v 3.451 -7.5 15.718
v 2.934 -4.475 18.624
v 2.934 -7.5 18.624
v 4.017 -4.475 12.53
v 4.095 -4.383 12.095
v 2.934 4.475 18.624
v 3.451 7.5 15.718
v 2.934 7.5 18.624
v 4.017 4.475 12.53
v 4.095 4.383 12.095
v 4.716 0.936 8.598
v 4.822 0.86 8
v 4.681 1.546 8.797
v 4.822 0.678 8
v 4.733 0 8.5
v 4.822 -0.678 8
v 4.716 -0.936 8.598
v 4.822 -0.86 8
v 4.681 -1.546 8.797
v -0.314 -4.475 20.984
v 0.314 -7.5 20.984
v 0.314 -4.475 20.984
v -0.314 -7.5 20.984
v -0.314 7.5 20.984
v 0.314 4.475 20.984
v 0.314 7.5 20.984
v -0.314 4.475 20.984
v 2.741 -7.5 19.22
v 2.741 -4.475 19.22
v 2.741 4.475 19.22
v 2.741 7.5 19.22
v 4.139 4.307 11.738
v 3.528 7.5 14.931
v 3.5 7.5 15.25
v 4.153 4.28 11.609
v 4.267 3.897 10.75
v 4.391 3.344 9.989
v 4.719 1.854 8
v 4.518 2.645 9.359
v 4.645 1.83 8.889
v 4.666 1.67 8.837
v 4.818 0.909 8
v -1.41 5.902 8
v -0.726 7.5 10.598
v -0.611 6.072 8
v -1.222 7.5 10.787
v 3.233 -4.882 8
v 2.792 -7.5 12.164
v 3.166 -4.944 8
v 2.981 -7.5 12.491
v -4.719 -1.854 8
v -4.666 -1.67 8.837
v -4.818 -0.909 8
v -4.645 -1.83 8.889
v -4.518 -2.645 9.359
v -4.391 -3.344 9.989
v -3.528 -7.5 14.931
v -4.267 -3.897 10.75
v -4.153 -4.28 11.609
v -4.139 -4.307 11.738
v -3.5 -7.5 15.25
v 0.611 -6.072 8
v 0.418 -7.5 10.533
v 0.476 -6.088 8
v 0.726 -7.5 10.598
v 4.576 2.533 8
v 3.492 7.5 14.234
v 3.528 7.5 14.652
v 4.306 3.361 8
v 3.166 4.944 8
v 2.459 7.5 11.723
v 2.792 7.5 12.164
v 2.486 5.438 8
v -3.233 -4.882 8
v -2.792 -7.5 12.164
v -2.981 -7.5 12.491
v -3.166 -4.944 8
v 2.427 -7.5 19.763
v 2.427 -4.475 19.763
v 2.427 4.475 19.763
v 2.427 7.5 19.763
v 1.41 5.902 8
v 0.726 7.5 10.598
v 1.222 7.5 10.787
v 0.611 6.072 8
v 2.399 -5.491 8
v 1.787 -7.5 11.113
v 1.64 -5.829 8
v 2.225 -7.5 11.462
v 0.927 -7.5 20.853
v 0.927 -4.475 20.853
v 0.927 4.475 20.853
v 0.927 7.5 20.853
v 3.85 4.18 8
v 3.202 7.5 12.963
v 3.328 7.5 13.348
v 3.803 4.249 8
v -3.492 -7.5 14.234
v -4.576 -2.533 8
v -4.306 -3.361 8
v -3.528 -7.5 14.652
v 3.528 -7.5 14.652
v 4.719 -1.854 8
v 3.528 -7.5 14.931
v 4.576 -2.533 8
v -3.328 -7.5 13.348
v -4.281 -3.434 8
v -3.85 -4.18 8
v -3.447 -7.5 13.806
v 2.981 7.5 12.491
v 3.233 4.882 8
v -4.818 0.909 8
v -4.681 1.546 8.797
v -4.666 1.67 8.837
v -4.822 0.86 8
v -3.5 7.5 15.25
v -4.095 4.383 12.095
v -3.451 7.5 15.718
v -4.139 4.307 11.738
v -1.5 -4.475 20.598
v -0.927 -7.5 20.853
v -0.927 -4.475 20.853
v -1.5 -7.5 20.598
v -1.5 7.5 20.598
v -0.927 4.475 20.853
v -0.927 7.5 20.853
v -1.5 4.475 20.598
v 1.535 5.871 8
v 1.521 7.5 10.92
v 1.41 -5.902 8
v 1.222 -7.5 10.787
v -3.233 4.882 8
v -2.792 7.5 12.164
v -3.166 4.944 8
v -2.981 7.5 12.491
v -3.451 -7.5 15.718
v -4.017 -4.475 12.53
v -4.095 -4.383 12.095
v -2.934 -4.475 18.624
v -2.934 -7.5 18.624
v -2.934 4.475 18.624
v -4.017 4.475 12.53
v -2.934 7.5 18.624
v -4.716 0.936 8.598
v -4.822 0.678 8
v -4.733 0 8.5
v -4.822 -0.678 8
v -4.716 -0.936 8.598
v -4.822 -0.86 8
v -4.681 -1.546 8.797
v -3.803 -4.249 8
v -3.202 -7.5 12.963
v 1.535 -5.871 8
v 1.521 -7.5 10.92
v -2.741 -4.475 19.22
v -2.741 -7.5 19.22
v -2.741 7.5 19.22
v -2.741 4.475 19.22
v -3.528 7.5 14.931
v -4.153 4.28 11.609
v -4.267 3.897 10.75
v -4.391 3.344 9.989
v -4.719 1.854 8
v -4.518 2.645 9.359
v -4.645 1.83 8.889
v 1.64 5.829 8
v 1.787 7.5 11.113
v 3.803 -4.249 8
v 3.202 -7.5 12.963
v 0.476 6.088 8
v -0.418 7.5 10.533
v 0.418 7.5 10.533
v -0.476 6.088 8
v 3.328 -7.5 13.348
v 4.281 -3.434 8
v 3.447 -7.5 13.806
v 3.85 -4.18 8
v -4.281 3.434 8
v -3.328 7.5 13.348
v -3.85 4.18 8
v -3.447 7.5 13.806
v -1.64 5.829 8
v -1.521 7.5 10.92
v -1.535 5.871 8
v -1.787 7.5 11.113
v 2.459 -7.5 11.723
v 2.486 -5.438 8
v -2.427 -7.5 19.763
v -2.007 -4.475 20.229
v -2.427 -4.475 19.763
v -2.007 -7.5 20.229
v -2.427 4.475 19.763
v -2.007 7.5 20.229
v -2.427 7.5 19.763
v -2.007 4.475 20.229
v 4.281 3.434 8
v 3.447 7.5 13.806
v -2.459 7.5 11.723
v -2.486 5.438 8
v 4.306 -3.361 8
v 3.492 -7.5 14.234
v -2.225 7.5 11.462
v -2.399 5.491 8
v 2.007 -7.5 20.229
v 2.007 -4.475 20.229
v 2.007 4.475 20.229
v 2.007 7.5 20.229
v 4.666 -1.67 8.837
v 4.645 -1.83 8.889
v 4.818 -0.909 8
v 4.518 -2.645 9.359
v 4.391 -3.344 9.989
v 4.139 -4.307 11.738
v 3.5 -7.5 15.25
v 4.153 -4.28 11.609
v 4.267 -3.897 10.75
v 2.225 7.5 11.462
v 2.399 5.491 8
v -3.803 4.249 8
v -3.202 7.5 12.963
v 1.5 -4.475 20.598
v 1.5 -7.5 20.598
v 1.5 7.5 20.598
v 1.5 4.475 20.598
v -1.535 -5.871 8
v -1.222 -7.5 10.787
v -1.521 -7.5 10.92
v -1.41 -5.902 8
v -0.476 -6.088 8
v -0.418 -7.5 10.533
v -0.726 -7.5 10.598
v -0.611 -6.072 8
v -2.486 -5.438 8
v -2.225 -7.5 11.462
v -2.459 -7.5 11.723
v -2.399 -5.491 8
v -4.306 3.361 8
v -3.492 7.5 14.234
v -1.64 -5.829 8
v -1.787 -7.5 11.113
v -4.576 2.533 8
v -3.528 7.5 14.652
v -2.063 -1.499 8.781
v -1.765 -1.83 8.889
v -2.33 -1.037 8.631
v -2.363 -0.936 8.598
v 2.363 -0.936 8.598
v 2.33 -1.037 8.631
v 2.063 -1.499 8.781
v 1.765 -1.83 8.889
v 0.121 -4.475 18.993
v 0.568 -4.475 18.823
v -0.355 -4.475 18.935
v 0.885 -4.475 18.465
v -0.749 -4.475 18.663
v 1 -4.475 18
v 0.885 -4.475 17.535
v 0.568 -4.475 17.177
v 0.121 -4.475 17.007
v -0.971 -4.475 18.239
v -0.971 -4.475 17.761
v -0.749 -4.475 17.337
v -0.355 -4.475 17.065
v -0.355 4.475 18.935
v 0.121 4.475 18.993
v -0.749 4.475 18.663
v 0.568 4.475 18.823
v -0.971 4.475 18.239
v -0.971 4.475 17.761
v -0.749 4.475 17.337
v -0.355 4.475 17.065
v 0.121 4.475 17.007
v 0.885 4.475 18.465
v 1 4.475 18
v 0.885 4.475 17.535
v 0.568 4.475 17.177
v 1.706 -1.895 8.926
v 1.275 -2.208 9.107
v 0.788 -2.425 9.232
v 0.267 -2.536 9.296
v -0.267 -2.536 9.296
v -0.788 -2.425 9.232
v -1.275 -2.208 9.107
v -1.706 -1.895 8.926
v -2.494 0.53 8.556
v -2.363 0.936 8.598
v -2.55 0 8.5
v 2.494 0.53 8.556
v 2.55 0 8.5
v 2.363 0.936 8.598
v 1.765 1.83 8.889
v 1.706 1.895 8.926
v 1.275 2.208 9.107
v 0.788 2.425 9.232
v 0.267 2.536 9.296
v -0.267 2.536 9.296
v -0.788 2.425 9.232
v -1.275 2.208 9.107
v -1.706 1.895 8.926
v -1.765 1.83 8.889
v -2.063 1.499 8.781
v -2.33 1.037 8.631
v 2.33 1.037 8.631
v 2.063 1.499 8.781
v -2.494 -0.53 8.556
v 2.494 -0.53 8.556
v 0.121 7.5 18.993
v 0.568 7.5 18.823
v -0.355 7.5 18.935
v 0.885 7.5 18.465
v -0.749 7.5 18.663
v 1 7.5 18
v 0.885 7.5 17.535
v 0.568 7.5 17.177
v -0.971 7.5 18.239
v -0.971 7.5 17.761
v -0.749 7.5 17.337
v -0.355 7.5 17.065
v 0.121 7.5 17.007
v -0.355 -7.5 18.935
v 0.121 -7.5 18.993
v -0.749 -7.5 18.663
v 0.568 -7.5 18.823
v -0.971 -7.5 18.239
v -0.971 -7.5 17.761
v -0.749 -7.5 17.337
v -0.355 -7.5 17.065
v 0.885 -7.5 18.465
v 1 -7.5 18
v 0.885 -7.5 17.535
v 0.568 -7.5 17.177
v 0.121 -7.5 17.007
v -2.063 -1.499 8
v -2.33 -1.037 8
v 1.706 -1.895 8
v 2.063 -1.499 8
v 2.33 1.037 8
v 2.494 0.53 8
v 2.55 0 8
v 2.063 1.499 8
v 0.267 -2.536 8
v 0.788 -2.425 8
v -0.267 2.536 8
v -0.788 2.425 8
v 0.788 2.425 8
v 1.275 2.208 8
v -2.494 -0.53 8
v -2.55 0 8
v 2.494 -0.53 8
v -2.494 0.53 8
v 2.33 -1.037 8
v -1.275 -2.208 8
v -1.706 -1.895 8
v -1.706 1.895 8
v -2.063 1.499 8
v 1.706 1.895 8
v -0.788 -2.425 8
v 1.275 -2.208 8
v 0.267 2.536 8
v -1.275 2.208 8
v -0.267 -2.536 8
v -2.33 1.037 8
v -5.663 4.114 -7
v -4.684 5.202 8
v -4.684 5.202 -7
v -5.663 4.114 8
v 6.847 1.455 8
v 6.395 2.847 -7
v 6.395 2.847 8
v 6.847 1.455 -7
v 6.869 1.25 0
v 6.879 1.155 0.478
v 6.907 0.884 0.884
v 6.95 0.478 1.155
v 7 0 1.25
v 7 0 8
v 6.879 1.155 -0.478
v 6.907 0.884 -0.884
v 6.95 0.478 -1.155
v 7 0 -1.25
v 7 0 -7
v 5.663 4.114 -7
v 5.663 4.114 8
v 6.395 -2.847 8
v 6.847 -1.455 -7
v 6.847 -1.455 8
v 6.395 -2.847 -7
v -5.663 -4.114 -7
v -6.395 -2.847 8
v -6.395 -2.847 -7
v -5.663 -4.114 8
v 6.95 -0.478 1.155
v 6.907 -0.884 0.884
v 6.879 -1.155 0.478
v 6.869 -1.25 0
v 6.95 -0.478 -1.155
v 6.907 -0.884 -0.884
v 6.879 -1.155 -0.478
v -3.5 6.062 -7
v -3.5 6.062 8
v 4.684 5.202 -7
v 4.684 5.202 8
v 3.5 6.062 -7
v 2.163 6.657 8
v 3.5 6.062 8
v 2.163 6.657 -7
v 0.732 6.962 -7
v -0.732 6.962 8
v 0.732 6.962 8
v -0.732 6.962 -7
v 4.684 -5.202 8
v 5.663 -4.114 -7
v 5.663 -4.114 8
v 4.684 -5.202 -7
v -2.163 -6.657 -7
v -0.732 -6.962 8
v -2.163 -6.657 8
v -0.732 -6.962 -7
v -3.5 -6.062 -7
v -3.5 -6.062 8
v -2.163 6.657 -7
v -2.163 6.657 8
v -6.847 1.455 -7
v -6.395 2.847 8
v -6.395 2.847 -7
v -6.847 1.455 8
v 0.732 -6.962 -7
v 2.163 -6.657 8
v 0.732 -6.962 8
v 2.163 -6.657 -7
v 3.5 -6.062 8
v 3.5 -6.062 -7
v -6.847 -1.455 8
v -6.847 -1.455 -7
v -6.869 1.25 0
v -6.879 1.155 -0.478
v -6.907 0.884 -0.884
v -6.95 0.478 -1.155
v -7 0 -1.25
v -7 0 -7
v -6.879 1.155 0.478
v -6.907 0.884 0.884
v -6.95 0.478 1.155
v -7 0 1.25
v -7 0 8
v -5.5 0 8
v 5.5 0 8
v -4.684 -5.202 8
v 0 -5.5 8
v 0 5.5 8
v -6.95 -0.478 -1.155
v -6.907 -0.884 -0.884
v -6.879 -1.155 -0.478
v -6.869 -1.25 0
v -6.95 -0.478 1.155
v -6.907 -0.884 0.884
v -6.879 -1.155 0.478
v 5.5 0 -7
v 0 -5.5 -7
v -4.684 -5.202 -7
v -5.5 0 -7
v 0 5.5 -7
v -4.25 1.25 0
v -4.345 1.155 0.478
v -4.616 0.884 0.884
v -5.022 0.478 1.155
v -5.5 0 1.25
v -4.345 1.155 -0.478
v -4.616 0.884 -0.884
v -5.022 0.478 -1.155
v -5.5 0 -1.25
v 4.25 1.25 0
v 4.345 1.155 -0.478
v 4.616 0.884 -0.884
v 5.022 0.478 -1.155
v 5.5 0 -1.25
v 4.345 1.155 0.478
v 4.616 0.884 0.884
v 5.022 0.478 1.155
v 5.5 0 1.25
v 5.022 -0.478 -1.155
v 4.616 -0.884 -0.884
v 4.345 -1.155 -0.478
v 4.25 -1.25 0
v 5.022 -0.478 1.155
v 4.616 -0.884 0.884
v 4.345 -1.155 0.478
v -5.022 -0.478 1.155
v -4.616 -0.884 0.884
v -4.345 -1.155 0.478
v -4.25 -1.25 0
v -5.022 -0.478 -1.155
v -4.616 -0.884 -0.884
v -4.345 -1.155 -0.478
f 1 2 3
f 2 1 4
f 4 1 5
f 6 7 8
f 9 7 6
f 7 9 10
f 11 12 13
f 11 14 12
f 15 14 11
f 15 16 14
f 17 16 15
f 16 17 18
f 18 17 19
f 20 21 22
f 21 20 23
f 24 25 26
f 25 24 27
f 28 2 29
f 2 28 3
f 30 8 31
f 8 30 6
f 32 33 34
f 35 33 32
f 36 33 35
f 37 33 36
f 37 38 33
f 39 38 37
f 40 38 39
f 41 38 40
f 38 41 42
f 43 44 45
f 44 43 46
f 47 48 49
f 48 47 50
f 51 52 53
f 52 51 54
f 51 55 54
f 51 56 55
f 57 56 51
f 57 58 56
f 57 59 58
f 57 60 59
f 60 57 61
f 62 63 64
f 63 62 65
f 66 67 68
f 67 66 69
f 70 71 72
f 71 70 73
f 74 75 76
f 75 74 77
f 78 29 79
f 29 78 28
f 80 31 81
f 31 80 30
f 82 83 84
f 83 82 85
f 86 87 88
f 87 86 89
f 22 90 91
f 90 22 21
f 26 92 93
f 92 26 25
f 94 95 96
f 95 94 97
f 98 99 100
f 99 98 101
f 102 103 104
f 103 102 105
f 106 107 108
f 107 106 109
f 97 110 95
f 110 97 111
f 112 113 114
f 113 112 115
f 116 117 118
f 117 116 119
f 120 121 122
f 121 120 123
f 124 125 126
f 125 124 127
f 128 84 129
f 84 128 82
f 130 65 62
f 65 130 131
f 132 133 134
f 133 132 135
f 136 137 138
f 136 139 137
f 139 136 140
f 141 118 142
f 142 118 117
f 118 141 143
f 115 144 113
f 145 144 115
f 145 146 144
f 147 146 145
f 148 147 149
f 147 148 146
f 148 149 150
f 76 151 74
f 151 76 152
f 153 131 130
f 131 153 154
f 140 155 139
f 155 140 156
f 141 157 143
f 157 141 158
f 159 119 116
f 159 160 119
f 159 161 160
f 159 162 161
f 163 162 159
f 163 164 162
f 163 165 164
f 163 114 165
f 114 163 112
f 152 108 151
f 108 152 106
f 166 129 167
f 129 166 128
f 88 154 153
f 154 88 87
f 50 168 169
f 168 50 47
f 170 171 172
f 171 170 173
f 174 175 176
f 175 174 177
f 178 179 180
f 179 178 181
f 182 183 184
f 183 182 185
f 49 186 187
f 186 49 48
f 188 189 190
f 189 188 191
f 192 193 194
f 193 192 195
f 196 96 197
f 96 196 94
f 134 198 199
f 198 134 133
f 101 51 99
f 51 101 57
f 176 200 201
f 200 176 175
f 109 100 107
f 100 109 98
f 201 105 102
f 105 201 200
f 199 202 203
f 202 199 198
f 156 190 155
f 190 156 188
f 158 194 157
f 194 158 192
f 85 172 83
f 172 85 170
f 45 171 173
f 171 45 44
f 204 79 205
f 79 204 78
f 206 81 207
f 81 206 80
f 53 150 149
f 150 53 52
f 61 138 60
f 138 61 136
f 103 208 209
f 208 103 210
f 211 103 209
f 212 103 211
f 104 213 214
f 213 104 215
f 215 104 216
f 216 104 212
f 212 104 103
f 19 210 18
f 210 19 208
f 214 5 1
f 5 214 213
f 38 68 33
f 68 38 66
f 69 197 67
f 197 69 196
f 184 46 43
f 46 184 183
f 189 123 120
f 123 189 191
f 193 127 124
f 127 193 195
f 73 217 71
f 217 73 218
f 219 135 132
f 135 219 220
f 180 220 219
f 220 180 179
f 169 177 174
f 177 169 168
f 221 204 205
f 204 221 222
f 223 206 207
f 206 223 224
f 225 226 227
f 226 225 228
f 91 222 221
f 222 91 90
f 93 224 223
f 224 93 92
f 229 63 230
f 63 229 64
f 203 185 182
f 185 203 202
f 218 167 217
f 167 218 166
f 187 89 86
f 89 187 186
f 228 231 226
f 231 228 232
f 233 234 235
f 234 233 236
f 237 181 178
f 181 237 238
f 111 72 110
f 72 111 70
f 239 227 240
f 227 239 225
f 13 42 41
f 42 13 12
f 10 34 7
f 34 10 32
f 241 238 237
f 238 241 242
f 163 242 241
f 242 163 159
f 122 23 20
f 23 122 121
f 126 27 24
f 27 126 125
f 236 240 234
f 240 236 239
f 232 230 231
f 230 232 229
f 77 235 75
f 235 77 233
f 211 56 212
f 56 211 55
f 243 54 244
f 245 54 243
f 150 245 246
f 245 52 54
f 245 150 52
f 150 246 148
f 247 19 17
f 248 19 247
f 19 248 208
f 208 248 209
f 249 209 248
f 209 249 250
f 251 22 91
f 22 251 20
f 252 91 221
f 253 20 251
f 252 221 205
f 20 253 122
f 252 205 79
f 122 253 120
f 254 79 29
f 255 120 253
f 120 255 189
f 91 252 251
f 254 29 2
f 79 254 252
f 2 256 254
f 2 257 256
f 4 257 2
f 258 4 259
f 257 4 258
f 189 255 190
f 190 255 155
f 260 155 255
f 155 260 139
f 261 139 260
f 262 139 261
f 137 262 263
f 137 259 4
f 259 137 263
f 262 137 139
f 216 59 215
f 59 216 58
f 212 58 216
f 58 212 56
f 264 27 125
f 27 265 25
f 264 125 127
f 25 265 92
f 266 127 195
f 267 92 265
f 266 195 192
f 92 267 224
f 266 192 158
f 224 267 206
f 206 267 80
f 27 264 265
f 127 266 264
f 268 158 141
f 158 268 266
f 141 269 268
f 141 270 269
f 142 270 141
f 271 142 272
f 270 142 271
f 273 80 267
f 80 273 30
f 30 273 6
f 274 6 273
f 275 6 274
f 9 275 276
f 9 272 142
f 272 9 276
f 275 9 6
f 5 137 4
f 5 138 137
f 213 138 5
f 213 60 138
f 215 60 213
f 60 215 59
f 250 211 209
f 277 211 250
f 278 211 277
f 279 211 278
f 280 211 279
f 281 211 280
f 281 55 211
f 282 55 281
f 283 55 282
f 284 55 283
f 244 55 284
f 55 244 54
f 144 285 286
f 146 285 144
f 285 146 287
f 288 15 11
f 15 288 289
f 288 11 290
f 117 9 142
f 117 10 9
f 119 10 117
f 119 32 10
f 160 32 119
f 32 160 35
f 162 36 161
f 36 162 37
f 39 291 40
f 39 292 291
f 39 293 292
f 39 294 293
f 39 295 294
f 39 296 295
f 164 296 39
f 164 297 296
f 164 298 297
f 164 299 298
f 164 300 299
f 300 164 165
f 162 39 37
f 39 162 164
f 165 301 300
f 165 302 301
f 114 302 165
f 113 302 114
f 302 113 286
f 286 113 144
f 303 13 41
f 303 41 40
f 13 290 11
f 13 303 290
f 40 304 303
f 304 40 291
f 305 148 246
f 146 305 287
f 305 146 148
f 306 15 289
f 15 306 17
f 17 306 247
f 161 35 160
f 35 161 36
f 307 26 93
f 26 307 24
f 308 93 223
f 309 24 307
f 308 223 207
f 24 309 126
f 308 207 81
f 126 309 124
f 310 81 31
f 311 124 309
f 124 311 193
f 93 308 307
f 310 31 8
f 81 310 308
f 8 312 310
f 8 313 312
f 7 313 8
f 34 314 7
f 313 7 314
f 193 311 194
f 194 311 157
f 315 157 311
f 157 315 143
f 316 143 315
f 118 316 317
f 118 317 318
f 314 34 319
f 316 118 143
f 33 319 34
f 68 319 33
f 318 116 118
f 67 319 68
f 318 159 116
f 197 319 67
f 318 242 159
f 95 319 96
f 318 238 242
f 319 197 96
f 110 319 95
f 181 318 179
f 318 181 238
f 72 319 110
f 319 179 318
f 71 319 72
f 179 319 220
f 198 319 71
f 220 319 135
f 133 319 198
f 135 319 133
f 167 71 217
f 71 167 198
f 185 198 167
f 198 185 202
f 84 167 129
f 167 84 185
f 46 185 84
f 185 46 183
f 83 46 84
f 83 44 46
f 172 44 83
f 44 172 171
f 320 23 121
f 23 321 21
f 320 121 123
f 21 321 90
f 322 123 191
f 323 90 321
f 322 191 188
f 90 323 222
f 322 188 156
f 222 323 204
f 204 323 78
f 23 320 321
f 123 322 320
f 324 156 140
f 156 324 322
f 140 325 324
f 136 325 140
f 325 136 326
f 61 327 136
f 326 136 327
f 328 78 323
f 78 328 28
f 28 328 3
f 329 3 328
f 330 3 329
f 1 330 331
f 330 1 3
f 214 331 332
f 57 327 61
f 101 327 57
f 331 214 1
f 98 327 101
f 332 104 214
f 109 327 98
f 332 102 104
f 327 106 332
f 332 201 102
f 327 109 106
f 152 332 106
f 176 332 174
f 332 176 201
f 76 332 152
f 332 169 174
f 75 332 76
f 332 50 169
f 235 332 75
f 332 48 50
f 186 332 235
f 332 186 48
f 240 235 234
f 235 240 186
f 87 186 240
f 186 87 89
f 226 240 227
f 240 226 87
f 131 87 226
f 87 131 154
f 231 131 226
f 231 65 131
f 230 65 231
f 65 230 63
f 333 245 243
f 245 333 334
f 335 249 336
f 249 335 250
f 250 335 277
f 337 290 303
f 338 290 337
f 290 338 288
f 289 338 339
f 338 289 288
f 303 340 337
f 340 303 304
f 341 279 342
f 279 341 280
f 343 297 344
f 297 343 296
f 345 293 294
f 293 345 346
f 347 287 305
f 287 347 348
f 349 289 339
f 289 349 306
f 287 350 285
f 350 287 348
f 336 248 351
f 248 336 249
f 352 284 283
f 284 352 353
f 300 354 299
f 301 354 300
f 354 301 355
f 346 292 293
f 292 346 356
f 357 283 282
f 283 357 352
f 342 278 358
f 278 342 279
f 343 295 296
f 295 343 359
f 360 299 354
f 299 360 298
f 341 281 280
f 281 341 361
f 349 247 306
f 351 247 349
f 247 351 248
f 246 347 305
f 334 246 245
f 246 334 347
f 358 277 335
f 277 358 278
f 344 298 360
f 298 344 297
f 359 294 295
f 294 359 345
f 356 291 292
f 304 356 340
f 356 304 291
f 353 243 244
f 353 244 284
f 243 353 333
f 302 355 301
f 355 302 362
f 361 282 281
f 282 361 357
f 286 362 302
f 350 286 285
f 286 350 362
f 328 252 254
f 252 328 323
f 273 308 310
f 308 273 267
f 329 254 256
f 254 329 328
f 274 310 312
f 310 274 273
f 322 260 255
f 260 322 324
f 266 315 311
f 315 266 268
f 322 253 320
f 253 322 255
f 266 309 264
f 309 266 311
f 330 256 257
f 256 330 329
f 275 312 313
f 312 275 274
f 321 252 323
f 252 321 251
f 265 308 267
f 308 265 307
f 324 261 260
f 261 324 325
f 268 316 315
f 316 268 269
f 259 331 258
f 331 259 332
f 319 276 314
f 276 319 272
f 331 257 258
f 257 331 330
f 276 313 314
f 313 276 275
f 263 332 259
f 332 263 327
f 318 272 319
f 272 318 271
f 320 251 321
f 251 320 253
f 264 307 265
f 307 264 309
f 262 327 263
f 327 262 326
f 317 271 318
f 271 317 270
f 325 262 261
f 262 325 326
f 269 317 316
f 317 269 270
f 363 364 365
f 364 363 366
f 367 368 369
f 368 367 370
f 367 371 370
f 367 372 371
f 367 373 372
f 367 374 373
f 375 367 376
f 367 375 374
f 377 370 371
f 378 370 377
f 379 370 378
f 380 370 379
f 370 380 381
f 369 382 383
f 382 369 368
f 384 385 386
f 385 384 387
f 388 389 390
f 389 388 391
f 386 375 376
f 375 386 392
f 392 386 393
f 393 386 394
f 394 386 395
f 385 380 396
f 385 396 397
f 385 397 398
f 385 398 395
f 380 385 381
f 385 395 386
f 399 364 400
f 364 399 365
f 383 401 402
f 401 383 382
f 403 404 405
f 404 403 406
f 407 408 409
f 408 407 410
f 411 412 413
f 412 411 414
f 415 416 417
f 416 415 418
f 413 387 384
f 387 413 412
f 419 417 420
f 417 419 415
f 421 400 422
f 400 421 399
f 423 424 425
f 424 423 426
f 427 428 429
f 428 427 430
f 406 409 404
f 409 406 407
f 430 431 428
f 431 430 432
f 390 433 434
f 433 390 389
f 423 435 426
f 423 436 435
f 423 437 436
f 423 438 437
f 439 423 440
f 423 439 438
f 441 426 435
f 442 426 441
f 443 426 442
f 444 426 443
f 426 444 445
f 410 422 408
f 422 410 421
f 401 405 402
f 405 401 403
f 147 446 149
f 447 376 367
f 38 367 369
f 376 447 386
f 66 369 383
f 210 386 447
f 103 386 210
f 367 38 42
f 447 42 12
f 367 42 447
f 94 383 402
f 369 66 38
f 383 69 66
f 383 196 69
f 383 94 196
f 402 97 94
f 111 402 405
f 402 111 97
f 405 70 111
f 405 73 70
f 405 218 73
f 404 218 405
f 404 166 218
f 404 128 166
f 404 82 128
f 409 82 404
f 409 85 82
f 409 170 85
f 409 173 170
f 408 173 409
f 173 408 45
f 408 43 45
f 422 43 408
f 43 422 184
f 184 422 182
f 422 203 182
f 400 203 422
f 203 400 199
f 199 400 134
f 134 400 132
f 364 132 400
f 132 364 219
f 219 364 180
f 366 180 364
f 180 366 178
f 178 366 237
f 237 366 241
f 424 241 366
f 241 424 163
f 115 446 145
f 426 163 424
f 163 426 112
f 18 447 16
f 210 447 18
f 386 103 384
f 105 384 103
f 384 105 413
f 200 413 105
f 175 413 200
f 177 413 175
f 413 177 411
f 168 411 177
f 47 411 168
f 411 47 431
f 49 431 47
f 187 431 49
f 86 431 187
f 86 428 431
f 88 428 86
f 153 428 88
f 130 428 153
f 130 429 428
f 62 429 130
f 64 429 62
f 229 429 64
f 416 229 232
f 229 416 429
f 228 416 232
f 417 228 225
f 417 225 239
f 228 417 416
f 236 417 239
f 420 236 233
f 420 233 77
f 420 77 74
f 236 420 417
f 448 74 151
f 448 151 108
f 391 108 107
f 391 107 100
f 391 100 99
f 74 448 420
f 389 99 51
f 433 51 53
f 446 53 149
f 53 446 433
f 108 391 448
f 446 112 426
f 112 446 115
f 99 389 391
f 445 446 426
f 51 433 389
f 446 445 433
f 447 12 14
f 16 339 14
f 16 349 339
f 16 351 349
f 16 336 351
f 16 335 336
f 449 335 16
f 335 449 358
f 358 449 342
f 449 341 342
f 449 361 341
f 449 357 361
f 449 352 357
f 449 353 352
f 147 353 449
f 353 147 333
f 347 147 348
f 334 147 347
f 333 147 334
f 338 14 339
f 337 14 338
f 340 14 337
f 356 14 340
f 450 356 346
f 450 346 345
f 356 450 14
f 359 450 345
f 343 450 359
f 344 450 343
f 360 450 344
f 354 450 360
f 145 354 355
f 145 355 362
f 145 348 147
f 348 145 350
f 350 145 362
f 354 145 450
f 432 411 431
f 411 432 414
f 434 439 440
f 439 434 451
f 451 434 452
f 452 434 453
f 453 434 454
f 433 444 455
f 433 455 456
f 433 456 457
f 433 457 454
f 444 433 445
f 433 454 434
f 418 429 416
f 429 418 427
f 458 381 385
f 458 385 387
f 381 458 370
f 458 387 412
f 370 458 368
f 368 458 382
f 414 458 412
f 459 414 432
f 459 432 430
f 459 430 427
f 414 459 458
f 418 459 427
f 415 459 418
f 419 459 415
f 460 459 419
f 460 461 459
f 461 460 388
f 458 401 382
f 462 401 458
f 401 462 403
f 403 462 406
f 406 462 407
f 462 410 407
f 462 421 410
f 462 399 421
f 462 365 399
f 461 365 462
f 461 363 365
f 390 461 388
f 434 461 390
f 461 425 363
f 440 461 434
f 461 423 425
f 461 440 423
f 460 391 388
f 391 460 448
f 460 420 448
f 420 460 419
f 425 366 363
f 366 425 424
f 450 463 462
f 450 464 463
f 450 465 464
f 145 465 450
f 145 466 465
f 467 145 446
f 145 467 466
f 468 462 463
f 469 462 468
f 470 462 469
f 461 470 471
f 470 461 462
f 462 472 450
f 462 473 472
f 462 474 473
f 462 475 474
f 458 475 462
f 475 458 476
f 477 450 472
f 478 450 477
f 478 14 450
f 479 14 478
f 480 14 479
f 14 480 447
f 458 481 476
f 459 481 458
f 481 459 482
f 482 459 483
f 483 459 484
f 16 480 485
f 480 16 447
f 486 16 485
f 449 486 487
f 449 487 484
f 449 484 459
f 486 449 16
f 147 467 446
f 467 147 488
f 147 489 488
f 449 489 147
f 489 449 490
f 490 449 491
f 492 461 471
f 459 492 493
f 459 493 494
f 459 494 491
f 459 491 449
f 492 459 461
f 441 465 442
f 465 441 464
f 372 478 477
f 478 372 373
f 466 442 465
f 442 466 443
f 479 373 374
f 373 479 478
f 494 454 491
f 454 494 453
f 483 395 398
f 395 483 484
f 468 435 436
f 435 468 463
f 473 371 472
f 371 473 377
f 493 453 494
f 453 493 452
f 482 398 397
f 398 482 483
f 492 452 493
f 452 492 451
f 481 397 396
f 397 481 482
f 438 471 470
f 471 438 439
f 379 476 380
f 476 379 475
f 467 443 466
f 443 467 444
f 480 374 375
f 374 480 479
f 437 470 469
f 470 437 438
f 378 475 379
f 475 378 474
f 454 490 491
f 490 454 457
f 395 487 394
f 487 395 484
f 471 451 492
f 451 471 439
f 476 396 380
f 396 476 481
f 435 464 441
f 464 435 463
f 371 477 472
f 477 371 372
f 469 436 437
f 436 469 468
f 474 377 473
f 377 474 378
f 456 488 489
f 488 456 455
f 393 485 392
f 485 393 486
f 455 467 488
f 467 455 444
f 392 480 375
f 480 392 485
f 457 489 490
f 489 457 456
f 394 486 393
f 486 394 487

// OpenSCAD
shaft_d = 5.1;
shaft_pin = 2.5;
mount_d = 6;
mount_pin = 2;
d = 10;
h0 = 6;
h1 = 18;
h2 = -5;
$fs=0.5;
fork_d = 9;

module fork() {
    w= 15;
    w1 = w +5;

    difference() {
        union() {
            hull() {
                translate([0,w1/2,h1]) rotate([90,0,0]) cylinder(d=mount_d, h=w1);
                translate([0,0,h0]) rotate([0,0,0]) cylinder(d=10, h=1);
            }
            cylinder(d=10, h=h0);
        }
        hull() {
            translate([-10,0,h1+h2]) rotate([0,90,0]) cylinder(d=fork_d, h=w1);
            translate([-10,0,h1+100]) rotate([0,90,0]) cylinder(d=fork_d, h=w1);
        }
        
        // side trim
        translate([-15, w/2 ,0]) cube(30);
        translate([-15, -30-w/2 ,0]) cube(30);
        
        // shaft hole
        cylinder(d= shaft_d, h= h1);
        // shaft pin
        translate([-30,0,h0/2]) rotate([0,90,0]) cylinder(d= shaft_pin, h= 60);
        
        //mount hole
        translate([0,w1/2,h1]) rotate([90,0,0]) cylinder(d=mount_pin, h=w1);
    }
}
module fork_male() {
    l = 50;
    difference() {
        union() {
            fork();
            //translate([0,0,-l+8])cylinder(d=10, h=l);
            translate([0,0,-l+8])cylinder(d=6.5, h=l, $fn=4);
        }
        
    }
    
}

module fork_female() {
    l = 50;
    difference() {
        union() {
            fork();
            translate([0,0,-l+8])cylinder(d=10, h=l);
        }
        translate([0,0,-l+8])cylinder(d=7.5, h=l, $fn=4);
    }
    
}
module fork_big() {
    l = 15;
    difference() {
        union() {
            fork();
            translate([0,0,-l+8])cylinder(d=14, h=l);
        }
        translate([0,0,-l+8])cylinder(d=11, h=l, $fn=4);
        translate([-30,0,0]) rotate([0,90,0]) cylinder(d= shaft_pin, h= 60);
    }
    
}
module ball() {
    $fs=0.5;
    difference() { 
        cylinder(d=8, h=8);
        translate([0,10,1+2]) rotate([90,0,0]) cylinder(d=2, h=80);
        translate([-10,0,1+2+2]) rotate([0,90,0]) cylinder(d=2, h=80);
    }
}

module display() {
    translate([0,0,h1-2-1]) ball();
    fork();
    translate([0,0,h1*2+2]) rotate([0,0,90]) rotate([180,0,0]) fork();
    translate([h1,0,h1]) rotate([0,90,0])  rotate([0,0,90]) rotate([180,0,0]) fork();

}
//fork();
//ball();
//fork_male();
//fork_female();
fork_big();
